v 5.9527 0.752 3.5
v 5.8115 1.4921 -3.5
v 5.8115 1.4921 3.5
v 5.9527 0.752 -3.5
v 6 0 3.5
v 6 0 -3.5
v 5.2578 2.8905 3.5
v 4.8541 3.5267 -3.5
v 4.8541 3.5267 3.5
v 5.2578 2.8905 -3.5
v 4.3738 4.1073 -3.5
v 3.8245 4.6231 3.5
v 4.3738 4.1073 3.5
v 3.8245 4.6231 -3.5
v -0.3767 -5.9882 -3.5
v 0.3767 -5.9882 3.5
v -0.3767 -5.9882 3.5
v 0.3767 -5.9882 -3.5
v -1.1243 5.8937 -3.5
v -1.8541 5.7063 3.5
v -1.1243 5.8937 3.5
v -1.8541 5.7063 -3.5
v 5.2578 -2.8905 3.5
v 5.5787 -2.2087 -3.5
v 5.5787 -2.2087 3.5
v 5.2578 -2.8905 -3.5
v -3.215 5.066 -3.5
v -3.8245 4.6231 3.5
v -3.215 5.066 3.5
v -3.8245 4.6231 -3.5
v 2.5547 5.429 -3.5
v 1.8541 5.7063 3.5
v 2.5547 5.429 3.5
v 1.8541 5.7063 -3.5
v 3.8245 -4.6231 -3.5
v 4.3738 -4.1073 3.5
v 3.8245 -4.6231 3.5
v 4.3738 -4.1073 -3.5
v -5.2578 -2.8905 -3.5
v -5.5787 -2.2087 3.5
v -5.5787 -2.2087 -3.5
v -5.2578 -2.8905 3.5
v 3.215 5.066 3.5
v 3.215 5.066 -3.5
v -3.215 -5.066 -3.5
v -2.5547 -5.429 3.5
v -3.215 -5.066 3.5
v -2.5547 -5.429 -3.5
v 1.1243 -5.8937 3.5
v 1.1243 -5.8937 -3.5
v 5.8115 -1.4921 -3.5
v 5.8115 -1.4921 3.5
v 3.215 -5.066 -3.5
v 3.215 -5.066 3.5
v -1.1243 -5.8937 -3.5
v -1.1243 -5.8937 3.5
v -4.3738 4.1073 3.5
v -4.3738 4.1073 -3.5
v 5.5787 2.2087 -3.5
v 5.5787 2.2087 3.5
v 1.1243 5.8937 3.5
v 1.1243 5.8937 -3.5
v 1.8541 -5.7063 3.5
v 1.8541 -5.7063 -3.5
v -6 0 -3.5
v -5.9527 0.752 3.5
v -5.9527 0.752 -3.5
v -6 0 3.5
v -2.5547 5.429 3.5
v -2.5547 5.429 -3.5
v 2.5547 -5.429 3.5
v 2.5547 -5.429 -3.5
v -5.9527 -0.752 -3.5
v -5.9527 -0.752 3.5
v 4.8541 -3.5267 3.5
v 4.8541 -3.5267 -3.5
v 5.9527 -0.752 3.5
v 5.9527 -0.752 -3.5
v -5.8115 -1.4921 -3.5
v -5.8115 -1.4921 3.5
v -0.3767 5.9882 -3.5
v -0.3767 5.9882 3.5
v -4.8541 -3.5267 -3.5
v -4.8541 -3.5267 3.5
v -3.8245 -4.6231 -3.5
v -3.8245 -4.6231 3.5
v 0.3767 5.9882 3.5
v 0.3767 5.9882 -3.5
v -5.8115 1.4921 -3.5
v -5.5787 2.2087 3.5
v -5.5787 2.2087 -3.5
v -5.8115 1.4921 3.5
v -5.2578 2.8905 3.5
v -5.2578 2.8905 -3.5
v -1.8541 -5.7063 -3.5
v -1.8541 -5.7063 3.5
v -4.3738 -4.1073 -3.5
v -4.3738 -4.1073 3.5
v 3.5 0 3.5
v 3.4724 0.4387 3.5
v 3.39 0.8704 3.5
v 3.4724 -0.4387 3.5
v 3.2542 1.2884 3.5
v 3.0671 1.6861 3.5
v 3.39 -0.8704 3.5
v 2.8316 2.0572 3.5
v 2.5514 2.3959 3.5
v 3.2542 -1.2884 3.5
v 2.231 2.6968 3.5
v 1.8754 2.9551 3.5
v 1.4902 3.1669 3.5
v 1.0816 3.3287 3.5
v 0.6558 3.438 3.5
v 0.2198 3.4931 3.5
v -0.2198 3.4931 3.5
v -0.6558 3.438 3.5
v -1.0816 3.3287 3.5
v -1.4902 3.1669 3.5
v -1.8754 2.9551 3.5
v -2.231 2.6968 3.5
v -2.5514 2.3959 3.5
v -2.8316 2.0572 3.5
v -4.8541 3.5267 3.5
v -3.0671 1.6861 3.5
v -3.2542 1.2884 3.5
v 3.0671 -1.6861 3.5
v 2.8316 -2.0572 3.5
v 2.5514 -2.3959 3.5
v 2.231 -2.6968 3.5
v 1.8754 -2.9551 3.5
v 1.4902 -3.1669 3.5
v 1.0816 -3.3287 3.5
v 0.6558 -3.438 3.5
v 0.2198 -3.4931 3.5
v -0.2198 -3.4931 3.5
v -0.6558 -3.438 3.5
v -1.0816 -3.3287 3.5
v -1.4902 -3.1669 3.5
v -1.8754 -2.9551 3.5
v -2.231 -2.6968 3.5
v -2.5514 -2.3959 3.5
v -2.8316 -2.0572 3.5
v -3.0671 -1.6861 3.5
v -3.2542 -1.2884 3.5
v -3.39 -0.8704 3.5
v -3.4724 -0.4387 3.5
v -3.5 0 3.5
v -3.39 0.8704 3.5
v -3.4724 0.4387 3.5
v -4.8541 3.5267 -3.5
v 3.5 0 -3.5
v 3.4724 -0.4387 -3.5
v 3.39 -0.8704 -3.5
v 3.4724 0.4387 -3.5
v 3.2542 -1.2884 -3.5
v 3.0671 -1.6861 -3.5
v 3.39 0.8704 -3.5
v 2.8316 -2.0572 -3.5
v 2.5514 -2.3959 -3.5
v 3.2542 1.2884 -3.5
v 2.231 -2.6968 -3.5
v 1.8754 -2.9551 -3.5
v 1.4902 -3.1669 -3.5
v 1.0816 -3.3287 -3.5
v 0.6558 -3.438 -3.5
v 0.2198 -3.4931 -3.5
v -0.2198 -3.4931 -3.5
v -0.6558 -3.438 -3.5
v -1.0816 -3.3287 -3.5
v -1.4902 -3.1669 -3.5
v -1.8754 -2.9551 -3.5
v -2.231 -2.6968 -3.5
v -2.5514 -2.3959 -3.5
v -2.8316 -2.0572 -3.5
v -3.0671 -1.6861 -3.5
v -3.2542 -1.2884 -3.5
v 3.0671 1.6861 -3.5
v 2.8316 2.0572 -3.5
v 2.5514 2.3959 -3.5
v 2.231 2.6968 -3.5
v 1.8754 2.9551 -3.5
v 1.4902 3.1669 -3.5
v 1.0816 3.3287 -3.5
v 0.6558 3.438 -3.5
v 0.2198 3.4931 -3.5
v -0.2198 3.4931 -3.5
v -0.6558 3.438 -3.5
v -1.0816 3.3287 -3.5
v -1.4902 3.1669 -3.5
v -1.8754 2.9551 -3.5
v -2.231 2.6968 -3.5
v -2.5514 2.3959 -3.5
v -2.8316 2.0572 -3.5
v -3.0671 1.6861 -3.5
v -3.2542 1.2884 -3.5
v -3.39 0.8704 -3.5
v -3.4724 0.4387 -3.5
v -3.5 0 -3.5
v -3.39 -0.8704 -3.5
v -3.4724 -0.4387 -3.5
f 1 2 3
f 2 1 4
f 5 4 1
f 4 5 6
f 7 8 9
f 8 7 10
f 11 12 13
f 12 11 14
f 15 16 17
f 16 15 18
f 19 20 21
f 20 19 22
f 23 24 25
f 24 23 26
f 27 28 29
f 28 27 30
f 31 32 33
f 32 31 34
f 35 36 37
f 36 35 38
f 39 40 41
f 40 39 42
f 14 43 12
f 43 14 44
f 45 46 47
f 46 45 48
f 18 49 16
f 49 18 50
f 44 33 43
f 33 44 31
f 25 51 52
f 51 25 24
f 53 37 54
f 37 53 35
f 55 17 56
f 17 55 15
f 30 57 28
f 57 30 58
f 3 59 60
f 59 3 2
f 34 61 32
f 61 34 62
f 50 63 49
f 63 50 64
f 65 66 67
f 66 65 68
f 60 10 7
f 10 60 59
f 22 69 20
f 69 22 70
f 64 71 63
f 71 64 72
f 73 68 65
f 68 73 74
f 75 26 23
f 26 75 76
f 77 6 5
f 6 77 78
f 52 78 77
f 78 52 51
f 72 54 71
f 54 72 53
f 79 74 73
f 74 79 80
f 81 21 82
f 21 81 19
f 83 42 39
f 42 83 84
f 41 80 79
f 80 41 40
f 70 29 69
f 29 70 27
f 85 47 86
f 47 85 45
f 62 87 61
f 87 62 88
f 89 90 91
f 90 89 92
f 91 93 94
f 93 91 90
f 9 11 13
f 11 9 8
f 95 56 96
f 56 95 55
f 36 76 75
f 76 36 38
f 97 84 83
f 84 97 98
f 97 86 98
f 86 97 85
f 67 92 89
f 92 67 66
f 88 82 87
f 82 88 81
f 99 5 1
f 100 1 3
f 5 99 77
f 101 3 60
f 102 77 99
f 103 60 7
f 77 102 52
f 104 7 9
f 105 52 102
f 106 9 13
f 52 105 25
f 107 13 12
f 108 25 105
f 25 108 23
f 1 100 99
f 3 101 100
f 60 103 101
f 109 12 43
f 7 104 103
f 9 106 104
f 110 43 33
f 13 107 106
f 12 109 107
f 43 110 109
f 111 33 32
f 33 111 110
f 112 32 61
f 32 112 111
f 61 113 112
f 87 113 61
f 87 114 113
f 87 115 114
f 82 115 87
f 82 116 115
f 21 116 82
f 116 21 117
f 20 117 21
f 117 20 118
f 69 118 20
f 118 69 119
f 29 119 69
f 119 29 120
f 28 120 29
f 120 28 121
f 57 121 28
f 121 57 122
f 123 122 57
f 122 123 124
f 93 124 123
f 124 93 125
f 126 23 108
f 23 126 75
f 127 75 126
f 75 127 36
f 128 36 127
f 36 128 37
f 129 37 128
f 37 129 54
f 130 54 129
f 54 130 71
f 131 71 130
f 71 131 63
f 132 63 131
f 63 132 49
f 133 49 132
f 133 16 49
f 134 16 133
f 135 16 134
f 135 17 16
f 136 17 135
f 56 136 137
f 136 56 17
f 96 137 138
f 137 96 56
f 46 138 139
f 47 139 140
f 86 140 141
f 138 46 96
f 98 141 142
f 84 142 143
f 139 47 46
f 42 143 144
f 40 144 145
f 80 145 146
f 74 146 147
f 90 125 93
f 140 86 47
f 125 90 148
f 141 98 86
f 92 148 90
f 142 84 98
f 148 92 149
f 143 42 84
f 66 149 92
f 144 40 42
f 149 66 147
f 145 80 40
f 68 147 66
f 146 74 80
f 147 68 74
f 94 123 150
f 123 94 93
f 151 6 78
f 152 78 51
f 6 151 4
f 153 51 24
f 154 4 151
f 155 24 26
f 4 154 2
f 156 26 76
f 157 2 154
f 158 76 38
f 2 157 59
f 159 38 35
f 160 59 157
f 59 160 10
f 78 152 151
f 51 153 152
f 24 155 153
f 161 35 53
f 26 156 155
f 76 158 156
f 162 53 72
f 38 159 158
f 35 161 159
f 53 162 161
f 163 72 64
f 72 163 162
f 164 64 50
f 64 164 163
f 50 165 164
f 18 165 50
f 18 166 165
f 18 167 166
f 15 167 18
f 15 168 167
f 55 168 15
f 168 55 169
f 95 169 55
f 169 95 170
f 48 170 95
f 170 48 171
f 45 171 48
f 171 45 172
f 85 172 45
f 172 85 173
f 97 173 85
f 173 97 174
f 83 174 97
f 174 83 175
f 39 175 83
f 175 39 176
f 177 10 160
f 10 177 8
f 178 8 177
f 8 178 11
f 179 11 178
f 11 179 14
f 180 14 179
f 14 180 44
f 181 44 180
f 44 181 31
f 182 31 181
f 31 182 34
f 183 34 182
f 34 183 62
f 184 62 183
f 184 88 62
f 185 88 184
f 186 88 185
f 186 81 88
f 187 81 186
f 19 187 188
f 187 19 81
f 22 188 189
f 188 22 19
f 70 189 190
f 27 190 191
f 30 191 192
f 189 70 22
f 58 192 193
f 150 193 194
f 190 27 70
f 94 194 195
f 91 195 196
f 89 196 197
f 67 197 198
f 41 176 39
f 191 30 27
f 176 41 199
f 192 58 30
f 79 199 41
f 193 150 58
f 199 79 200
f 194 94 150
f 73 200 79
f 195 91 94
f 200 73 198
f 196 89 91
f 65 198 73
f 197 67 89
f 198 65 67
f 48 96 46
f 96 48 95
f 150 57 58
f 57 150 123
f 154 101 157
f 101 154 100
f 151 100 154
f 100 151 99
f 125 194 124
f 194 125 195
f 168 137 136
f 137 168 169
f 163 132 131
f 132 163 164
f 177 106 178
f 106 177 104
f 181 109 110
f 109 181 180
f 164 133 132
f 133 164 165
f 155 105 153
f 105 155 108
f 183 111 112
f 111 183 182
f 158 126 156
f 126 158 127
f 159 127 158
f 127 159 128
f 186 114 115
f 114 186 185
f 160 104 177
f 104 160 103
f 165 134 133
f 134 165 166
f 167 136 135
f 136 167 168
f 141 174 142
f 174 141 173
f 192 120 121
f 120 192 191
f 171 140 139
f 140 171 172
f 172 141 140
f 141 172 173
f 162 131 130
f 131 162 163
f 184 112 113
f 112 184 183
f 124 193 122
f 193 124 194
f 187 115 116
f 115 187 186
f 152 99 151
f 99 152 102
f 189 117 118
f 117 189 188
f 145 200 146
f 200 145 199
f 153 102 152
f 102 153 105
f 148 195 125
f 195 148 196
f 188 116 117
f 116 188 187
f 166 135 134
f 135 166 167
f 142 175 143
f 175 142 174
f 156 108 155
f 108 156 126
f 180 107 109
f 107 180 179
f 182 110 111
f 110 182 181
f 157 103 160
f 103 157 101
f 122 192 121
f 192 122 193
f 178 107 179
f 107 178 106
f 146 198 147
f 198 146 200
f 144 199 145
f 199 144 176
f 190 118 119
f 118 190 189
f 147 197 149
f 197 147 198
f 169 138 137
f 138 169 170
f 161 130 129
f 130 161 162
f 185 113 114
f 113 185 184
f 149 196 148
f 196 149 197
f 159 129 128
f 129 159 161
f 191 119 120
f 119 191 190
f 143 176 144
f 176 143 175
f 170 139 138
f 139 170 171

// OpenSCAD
$fn = 50;


difference() {
	union() {
		translate(v = [0, 0, -3.5000000000]) {
			cylinder(h = 7, r = 6.0000000000);
		}
	}
	union() {
		translate(v = [0, 0, -100.0000000000]) {
			cylinder(h = 200, r = 3.5000000000);
		}
	}
}
